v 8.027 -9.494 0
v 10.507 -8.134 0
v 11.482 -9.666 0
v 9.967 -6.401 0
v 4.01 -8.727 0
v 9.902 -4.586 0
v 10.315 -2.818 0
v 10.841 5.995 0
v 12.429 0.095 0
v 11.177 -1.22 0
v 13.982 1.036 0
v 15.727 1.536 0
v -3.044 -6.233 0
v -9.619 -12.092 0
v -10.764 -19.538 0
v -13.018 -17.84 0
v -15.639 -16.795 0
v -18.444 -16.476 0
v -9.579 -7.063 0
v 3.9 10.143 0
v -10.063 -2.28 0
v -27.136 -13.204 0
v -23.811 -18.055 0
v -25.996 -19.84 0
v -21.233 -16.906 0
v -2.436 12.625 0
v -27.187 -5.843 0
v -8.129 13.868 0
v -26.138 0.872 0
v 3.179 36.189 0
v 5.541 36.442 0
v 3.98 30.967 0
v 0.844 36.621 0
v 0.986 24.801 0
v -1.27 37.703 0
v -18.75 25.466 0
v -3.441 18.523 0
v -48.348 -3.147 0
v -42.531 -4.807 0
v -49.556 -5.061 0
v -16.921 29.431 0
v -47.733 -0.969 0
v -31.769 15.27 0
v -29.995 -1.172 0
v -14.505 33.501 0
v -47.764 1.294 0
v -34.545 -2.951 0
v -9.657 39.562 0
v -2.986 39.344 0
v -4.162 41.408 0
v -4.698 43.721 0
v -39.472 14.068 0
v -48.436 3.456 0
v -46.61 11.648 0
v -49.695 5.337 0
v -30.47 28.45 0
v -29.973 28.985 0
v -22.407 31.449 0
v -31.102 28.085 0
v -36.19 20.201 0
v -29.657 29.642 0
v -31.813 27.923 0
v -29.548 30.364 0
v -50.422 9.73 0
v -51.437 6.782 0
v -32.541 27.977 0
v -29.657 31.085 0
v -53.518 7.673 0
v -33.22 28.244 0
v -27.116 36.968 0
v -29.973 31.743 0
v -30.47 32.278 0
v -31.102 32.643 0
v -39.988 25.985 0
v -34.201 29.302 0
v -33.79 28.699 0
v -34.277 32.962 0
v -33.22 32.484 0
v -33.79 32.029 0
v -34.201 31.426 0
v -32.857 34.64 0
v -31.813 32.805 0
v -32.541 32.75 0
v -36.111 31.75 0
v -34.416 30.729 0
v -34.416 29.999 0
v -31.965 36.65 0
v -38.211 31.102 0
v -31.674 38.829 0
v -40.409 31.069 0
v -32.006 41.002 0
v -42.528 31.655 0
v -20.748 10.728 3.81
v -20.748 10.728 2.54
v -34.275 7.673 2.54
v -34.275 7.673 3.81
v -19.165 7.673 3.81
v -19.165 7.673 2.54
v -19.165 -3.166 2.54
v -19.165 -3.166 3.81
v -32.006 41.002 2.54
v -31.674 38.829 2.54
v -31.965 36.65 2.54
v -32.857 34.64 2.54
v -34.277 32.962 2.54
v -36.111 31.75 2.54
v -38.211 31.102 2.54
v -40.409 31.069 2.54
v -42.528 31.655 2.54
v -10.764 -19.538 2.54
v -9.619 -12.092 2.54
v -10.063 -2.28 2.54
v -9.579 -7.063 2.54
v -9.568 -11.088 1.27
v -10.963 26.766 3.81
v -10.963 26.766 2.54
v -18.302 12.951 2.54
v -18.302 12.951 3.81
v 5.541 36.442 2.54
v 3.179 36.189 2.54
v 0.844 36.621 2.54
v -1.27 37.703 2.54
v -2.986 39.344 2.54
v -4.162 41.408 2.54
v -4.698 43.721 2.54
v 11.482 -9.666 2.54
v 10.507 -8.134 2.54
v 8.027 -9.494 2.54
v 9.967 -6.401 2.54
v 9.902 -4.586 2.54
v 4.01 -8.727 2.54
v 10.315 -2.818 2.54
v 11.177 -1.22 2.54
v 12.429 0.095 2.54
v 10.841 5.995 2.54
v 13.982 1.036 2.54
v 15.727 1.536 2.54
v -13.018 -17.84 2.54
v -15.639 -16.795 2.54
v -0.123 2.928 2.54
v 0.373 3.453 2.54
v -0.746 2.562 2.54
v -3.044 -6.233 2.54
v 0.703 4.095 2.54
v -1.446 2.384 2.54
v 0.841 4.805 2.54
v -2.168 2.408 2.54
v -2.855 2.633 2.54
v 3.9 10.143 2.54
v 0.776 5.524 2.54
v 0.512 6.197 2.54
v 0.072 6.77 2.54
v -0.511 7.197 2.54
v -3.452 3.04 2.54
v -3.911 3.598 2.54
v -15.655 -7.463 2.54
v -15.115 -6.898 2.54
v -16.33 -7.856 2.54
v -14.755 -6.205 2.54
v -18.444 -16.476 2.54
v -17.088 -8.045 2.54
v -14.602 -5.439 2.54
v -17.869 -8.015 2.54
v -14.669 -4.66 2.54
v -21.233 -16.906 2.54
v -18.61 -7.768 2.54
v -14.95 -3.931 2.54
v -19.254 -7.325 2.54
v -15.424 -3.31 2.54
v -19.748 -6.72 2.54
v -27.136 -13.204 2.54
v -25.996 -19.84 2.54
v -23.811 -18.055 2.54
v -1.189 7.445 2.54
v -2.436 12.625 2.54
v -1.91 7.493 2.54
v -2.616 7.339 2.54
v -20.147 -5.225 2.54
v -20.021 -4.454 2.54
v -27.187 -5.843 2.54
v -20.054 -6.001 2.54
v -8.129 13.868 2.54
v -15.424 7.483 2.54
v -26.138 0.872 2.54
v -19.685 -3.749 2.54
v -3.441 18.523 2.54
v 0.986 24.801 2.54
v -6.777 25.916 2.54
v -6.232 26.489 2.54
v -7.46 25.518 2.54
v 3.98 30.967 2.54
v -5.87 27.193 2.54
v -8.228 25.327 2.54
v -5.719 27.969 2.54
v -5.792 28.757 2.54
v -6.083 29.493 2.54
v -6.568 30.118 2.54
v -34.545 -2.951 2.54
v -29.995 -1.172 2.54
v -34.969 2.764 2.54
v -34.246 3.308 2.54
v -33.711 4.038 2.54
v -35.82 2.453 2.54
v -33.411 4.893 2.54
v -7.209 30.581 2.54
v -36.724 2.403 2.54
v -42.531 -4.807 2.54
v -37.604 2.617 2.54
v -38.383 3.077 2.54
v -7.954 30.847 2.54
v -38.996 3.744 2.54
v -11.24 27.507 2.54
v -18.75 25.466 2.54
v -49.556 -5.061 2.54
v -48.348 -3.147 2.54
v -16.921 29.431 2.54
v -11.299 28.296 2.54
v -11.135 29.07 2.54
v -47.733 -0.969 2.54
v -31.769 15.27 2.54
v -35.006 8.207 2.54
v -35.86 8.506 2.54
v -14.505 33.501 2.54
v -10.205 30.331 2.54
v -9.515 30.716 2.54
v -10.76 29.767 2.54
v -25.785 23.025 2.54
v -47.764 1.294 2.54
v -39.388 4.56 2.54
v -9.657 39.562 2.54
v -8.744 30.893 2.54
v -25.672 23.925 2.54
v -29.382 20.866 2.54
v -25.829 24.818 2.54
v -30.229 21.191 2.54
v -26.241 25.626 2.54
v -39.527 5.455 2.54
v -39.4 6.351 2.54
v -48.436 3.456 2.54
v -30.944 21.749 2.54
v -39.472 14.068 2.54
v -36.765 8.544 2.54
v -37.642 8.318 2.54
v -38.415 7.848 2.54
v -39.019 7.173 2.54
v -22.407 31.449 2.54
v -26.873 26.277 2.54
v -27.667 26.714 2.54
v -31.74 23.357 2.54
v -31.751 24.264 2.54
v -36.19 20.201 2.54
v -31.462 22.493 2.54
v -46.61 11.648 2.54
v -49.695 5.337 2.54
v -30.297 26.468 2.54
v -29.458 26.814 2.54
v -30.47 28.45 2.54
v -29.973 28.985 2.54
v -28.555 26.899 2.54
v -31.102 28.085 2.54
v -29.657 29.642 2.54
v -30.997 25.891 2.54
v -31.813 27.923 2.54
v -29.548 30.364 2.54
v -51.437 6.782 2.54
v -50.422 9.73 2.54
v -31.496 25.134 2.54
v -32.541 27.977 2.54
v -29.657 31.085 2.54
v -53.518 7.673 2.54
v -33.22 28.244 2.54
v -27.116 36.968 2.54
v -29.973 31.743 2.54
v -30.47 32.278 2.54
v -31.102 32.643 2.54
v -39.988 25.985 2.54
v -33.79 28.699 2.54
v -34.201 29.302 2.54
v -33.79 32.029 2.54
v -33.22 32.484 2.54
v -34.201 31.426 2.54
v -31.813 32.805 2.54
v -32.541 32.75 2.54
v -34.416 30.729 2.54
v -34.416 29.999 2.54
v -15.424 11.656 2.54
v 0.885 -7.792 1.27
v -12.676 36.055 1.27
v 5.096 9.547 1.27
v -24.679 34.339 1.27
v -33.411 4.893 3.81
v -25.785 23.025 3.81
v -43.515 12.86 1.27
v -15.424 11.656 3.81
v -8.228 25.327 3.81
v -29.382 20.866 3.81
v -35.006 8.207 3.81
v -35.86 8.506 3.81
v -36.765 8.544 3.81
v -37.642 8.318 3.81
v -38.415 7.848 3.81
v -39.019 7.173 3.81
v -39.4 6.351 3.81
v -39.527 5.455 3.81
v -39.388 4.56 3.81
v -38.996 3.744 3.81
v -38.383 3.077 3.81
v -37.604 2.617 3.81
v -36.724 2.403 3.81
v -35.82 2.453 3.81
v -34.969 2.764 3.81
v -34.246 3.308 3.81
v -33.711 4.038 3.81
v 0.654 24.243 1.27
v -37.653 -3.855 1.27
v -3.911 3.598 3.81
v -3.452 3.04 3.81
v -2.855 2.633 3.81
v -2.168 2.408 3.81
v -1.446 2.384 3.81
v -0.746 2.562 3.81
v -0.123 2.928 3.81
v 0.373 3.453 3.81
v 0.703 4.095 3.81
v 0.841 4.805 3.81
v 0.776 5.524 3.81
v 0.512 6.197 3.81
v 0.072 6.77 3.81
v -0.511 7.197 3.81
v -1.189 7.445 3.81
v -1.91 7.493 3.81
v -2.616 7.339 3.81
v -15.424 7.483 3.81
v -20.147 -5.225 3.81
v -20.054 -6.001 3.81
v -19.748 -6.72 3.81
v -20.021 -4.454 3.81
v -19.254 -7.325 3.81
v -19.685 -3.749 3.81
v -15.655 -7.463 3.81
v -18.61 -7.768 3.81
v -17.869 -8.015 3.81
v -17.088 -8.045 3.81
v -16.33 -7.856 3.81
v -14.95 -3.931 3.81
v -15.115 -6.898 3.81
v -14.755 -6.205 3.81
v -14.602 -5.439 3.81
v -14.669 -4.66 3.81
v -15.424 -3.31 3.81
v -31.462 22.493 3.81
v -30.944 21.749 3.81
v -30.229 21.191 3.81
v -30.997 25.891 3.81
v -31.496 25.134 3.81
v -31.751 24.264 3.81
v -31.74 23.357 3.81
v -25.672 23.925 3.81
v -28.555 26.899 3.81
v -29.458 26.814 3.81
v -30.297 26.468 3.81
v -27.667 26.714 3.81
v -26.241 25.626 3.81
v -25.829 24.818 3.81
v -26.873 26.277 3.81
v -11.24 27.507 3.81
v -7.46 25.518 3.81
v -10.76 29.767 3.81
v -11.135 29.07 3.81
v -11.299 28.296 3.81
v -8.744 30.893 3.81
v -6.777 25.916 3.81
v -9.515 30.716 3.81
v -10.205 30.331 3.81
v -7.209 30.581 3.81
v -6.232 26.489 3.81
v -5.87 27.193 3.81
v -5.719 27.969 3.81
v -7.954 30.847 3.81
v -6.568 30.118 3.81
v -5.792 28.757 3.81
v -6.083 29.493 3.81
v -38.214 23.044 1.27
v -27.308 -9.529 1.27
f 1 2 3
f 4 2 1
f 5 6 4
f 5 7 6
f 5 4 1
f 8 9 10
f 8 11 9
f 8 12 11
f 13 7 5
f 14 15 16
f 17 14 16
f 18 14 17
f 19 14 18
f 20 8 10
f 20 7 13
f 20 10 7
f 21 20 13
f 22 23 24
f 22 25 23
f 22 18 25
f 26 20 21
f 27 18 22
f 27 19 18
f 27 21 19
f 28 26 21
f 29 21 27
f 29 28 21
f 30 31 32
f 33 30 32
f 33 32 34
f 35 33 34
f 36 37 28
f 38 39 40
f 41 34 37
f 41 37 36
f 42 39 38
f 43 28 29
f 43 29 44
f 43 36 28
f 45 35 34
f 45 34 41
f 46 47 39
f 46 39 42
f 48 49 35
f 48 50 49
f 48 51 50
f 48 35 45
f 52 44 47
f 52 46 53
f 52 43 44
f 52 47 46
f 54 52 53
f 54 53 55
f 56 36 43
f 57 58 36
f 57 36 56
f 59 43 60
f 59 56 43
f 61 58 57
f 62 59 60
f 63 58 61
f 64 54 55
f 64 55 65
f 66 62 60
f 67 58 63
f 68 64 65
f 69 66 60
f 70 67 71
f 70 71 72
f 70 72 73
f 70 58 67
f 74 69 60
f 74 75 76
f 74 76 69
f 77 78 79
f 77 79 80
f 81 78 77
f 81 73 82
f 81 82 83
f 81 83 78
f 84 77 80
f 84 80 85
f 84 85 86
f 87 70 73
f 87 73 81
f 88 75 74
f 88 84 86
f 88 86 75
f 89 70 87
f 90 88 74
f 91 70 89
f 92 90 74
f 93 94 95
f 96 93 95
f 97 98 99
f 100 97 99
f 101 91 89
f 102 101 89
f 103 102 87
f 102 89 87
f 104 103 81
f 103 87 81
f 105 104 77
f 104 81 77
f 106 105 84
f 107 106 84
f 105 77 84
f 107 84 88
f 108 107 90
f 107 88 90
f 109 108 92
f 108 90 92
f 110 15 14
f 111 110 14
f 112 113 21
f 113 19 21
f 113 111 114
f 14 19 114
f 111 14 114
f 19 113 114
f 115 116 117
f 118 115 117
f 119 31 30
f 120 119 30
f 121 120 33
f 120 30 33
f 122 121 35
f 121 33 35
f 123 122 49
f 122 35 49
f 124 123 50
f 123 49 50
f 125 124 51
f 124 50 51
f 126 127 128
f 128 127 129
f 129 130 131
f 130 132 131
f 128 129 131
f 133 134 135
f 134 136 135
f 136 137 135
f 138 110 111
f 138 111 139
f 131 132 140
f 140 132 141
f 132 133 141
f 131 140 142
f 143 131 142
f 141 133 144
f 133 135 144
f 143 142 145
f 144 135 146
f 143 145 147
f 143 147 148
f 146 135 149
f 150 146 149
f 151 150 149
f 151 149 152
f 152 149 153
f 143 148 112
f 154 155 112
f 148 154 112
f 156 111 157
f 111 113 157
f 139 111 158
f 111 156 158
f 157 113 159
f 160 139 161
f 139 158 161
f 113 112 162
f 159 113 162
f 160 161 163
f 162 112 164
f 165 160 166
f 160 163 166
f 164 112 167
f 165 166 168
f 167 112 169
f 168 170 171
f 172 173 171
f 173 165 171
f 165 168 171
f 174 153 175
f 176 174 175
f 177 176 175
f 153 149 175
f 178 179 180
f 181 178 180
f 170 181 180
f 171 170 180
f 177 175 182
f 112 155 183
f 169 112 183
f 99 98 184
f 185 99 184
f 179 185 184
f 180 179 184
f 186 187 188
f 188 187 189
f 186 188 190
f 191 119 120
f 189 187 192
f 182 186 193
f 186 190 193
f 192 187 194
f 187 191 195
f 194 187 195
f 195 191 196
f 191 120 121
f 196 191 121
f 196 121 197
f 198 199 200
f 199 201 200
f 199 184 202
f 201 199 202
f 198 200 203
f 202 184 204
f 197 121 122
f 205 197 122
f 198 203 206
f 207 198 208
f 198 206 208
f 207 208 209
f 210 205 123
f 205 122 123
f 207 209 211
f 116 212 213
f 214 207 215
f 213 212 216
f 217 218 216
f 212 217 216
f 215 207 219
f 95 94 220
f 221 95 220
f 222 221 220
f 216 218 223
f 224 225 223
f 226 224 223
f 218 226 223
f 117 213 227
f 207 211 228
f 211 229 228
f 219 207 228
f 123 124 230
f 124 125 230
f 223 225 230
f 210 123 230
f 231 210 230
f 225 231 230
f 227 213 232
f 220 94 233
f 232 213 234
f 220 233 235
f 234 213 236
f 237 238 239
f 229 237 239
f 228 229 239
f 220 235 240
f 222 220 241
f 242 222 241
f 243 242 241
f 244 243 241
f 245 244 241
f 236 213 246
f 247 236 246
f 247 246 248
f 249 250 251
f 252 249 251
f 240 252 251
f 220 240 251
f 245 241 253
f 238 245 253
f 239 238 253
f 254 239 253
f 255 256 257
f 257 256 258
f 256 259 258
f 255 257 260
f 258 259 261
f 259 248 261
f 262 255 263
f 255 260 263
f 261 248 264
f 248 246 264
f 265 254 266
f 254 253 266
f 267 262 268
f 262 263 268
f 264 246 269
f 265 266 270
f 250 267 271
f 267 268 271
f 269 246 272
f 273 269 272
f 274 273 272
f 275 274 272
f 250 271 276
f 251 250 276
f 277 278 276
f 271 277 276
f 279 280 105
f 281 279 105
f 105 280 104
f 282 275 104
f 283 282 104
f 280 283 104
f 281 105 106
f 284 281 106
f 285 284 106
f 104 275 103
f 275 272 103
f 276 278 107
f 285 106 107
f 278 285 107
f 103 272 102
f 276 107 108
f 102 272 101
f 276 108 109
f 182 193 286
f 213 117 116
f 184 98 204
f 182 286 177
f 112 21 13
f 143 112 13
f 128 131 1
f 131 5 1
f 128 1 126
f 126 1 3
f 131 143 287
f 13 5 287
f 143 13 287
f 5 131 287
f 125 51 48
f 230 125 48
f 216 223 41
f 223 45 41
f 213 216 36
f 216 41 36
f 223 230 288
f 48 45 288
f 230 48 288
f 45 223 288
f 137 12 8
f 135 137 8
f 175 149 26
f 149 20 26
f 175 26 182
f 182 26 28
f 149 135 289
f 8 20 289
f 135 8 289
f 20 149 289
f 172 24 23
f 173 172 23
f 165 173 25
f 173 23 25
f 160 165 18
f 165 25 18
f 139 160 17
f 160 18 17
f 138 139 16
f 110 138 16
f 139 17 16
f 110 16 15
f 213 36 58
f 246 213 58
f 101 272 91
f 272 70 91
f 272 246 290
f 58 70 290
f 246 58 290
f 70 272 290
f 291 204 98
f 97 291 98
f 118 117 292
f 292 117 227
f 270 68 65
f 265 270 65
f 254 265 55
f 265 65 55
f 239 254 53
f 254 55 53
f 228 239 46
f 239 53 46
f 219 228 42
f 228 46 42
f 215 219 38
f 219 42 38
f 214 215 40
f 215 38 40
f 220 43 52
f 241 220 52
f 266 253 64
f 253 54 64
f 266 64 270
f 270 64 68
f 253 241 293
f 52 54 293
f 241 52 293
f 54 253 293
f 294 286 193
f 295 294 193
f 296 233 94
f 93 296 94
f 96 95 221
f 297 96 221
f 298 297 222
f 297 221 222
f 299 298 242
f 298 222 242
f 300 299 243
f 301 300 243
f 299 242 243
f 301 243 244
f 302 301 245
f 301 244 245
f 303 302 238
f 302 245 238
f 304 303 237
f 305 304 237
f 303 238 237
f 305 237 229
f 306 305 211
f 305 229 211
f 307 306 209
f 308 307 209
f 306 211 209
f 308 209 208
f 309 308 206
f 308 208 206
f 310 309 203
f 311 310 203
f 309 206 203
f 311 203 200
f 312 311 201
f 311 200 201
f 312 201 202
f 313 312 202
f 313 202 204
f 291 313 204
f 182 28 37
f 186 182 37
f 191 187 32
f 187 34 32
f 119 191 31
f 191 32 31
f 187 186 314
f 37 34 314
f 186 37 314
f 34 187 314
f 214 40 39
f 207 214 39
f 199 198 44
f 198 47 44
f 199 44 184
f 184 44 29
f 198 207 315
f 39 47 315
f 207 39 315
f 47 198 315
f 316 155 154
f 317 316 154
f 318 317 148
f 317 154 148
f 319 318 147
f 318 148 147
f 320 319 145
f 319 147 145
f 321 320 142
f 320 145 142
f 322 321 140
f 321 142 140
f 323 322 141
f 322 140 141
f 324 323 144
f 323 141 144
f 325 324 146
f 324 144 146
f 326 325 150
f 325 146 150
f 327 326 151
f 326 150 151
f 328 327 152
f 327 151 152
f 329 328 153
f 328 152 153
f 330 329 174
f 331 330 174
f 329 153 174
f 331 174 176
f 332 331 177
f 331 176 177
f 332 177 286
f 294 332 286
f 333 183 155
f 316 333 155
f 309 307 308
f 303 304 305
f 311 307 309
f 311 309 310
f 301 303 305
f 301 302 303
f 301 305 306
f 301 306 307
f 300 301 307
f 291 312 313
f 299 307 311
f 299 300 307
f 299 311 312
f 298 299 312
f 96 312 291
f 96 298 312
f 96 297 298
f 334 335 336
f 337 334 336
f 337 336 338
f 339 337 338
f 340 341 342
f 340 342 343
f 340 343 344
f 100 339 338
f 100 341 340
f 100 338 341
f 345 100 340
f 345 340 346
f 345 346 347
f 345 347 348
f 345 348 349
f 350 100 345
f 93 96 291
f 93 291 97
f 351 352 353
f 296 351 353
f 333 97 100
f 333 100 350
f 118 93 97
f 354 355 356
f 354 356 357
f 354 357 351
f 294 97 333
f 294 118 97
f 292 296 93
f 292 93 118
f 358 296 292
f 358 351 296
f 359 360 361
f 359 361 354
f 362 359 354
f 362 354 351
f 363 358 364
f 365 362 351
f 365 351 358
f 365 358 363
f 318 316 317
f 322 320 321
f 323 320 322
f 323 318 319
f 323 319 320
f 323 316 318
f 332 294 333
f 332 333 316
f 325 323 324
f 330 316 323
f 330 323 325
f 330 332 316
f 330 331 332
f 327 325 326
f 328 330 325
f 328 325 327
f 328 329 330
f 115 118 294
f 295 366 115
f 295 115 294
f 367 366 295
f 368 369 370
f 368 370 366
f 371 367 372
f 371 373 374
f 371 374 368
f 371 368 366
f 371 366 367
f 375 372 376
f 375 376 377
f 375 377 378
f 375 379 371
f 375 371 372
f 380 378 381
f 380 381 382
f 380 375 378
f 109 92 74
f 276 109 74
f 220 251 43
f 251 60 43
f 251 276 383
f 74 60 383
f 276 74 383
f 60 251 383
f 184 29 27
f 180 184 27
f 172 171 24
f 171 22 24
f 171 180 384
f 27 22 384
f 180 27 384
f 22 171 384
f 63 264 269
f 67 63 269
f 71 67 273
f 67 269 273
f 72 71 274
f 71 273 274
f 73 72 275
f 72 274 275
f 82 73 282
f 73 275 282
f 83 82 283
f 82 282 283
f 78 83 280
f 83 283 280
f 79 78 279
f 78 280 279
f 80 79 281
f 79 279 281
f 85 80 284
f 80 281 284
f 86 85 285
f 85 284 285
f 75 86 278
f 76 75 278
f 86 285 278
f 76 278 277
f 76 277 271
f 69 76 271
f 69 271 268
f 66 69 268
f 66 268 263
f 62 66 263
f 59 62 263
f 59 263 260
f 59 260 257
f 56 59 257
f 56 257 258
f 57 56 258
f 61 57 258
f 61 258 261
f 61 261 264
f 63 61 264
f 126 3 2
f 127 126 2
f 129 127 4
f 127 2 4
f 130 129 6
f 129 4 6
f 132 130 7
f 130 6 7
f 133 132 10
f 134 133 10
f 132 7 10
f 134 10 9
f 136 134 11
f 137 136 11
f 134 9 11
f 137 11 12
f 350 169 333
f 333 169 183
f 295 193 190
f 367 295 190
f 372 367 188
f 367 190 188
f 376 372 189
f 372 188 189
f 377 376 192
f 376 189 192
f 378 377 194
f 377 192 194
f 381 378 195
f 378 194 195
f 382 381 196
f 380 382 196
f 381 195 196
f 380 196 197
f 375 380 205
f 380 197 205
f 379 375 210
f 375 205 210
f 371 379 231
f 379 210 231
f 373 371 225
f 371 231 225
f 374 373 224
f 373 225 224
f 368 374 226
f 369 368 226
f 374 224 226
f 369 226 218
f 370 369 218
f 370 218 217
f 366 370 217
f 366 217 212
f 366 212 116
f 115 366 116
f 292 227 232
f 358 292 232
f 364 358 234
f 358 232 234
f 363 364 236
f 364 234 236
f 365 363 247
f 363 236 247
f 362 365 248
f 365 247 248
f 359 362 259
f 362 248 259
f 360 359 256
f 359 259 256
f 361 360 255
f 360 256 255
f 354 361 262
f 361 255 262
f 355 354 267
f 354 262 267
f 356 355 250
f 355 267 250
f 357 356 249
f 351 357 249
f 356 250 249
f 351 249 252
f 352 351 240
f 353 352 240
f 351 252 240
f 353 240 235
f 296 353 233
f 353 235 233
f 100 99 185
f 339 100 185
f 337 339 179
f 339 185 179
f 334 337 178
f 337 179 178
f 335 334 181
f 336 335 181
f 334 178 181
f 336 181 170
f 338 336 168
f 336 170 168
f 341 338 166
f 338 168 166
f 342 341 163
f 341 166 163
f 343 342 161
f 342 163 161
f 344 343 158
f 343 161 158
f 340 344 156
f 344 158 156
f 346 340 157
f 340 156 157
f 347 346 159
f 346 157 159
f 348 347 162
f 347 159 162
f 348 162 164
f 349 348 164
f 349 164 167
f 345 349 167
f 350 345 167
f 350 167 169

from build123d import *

# Parameters (mm, degrees)
F1_DEPTH = 2.54
F2_R     = 2.4478188867
F3_DEPTH = 25.4
F5_DEPTH = 1.27


with BuildPart() as f1:
    # F0 (on Top) → F1 (new body)
    with BuildSketch(Plane.XY):
        with BuildLine():
            add(Edge.make_bspline(
                [(-8.1293506725, 13.8677618036), (-13.0062829494, 14.4740161408), (-15.8992987585, 13.1955885586)],
                knots=[5.3621765201, 5.3621765201, 5.3621765201, 5.923451431, 5.923451431, 5.923451431], degree=2, weights=[1, 0.9608790786, 1]))
            add(Edge.make_bspline(
                [(-8.1293506725, 13.8677618036), (3.2191549473, 23.0429297149), (5.5405121801, 36.4422092533)],
                knots=[0.9210087871, 0.9210087871, 0.9210087871, 2.3368799745, 2.3368799745, 2.3368799745], degree=2, weights=[1, 0.7597059088, 1]))
            ThreePointArc((5.5405121801, 36.4422092533), (-1.2696831758, 37.7032314), (-4.698329526, 43.7209819636))
            add(Edge.make_bspline(
                [(-4.698329526, 43.7209819636), (-13.840110732, 37.842561491), (-18.7504788391, 25.4664124261)],
                knots=[3.9042333143, 3.9042333143, 3.9042333143, 5.1309929011, 5.1309929011, 5.1309929011], degree=2, weights=[1, 0.8177071664, 1]))
            add(Edge.make_bspline(
                [(-15.8992987585, 13.1955885586), (-14.9909904148, 18.0024303196), (-18.7504788391, 25.4664124261)],
                knots=[0.3890102653, 0.3890102653, 0.3890102653, 1.2079252474, 1.2079252474, 1.2079252474], degree=2, weights=[1, 0.917336937, 1]))
        make_face()
        with BuildLine():
            add(Edge.make_bspline(
                [(-18.3283618618, 11.1091458655), (-18.4977635058, 11.1131186151), (-18.6671083791, 11.1023364909)],
                knots=[3.1313329127, 3.1313329127, 3.1313329127, 3.1694409122, 3.1694409122, 3.1694409122], degree=2, weights=[1, 0.999818478, 1]))
            add(Edge.make_bspline(
                [(-15.8992987585, 13.1955885586), (-17.6072200733, 12.4408558295), (-18.3283618618, 11.1091458655)],
                knots=[5.923451431, 5.923451431, 5.923451431, 6.2605585753, 6.2605585753, 6.2605585753], degree=2, weights=[1, 0.9858284459, 1]))
            add(Edge.make_bspline(
                [(-15.8992987585, 13.1955885586), (-14.9909904148, 18.0024303196), (-18.7504788391, 25.4664124261)],
                knots=[0.3890102653, 0.3890102653, 0.3890102653, 1.2079252474, 1.2079252474, 1.2079252474], degree=2, weights=[1, 0.917336937, 1]))
            add(Edge.make_bspline(
                [(-18.7504788391, 25.4664124261), (-23.1152645716, 14.4653555432), (-18.6671083791, 11.1023364909)],
                knots=[5.1309929011, 5.1309929011, 5.1309929011, 6.2492635537, 6.2492635537, 6.2492635537], degree=2, weights=[1, 0.847714097, 1]))
        make_face()
        with BuildLine():
            add(Edge.make_bspline(
                [(-18.6671083791, 11.1023364909), (-18.9426872846, 11.084790486), (-19.217261025, 11.0282486857)],
                knots=[3.1694409122, 3.1694409122, 3.1694409122, 3.2314425944, 3.2314425944, 3.2314425944], degree=2, weights=[1, 0.9995195124, 1]))
            add(Edge.make_bspline(
                [(-18.7504788391, 25.4664124261), (-23.1152645716, 14.4653555432), (-18.6671083791, 11.1023364909)],
                knots=[5.1309929011, 5.1309929011, 5.1309929011, 6.2492635537, 6.2492635537, 6.2492635537], degree=2, weights=[1, 0.847714097, 1]))
            add(Edge.make_bspline(
                [(-18.7504788391, 25.4664124261), (-23.8658033607, 35.622233216), (-32.0064408454, 41.0016310267)],
                knots=[1.2079252474, 1.2079252474, 1.2079252474, 2.2747363454, 2.2747363454, 2.2747363454], degree=2, weights=[1, 0.861080452, 1]))
            ThreePointArc((-32.0064408454, 41.0016310267), (-34.2766878119, 32.9620074398), (-42.5278444814, 31.6551094622))
            add(Edge.make_bspline(
                [(-42.5278444814, 31.6551094622), (-39.4326529231, 22.5643761786), (-31.7688000788, 15.2701366935)],
                knots=[4.0918939552, 4.0918939552, 4.0918939552, 5.1043441076, 5.1043441076, 5.1043441076], degree=2, weights=[1, 0.8745811169, 1]))
            add(Edge.make_bspline(
                [(-19.217261025, 11.0282486857), (-21.0537599835, 15.8717065704), (-31.7688000788, 15.2701366935)],
                knots=[0.0355549151, 0.0355549151, 0.0355549151, 1.0884005179, 1.0884005179, 1.0884005179], degree=2, weights=[1, 0.8646099394, 1]))
        make_face()
        with BuildLine():
            add(Edge.make_bspline(
                [(-49.5557408605, -5.0613393168), (-37.4112986885, -6.0471883825), (-26.1381579613, 0.8721302608)],
                knots=[3.9984789777, 3.9984789777, 3.9984789777, 5.2750169926, 5.2750169926, 5.2750169926], degree=2, weights=[1, 0.8031282966, 1]))
            add(Edge.make_bspline(
                [(-22.0543003481, 9.3342240027), (-24.6998426208, 6.6251102399), (-26.1381579613, 0.8721302608)],
                knots=[3.5627929422, 3.5627929422, 3.5627929422, 4.1932217971, 4.1932217971, 4.1932217971], degree=2, weights=[1, 0.9507299239, 1]))
            add(Edge.make_bspline(
                [(-31.7688000788, 15.2701366935), (-26.5047883189, 10.2599984236), (-22.0543003481, 9.3342240027)],
                knots=[5.1043441076, 5.1043441076, 5.1043441076, 5.8320454274, 5.8320454274, 5.8320454274], degree=2, weights=[1, 0.9345334002, 1]))
            add(Edge.make_bspline(
                [(-31.7688000788, 15.2701366935), (-44.5755870345, 14.5511307743), (-53.518205674, 7.6725440865)],
                knots=[1.0884005179, 1.0884005179, 1.0884005179, 2.3025399143, 2.3025399143, 2.3025399143], degree=2, weights=[1, 0.821323171, 1]))
            ThreePointArc((-53.518205674, 7.6725440865), (-48.0219304325, 2.3993954651), (-49.5557408605, -5.0613393168))
        make_face()
        with BuildLine():
            ThreePointArc((-25.9959172097, -19.8404580769), (-18.4435146916, -16.4764784527), (-10.7636362879, -19.5382770108))
            add(Edge.make_bspline(
                [(-10.7636362879, -19.5382770108), (-8.6329149556, -11.286799204), (-10.0625585352, -2.2797077491)],
                knots=[1.0375960775, 1.0375960775, 1.0375960775, 1.9188268736, 1.9188268736, 1.9188268736], degree=2, weights=[1, 0.9044893696, 1]))
            add(Edge.make_bspline(
                [(-18.8036627166, 9.4223104106), (-19.1581055578, 4.0259429354), (-10.0625585352, -2.2797077491)],
                knots=[0.1725226653, 0.1725226653, 0.1725226653, 1.2141781775, 1.2141781775, 1.2141781775], degree=2, weights=[1, 0.8674075869, 1]))
            add(Edge.make_bspline(
                [(-18.968622651, 9.3695263971), (-18.8851978683, 9.3944363277), (-18.8036627166, 9.4223104106)],
                knots=[6.1291457004, 6.1291457004, 6.1291457004, 6.1478253328, 6.1478253328, 6.1478253328], degree=2, weights=[1, 0.9999563842, 1]))
            add(Edge.make_bspline(
                [(-26.1381579613, 0.8721302608), (-19.2047000054, 5.1278036404), (-18.968622651, 9.3695263971)],
                knots=[5.2750169926, 5.2750169926, 5.2750169926, 6.13113397, 6.13113397, 6.13113397], degree=2, weights=[1, 0.9097733954, 1]))
            add(Edge.make_bspline(
                [(-26.1381579613, 0.8721302608), (-28.7514373337, -9.580475983), (-25.9959172097, -19.8404580769)],
                knots=[4.1932217971, 4.1932217971, 4.1932217971, 5.2629472206, 5.2629472206, 5.2629472206], degree=2, weights=[1, 0.8603386164, 1]))
        make_face()
        with BuildLine():
            add(Edge.make_bspline(
                [(-10.0625585352, -2.2797077491), (-11.591893318, 7.3554617789), (-15.8909007735, 10.2708762745)],
                knots=[1.9188268736, 1.9188268736, 1.9188268736, 2.853170758, 2.853170758, 2.853170758], degree=2, weights=[1, 0.8928455097, 1]))
            add(Edge.make_bspline(
                [(-10.0625585352, -2.2797077491), (1.0990392267, -10.0176850683), (11.4824191077, -9.6655475308)],
                knots=[1.2141781775, 1.2141781775, 1.2141781775, 2.440947022, 2.440947022, 2.440947022], degree=2, weights=[1, 0.8177045019, 1]))
            ThreePointArc((11.4824191077, -9.6655475308), (10.3145579677, -2.8178027009), (15.7274971882, 1.5359999924))
            add(Edge.make_bspline(
                [(15.7274971882, 1.5359999924), (6.8261776479, 12.0086312281), (-8.1293506725, 13.8677618036)],
                knots=[3.9144495075, 3.9144495075, 3.9144495075, 5.3621765201, 5.3621765201, 5.3621765201], degree=2, weights=[1, 0.7492525877, 1]))
            add(Edge.make_bspline(
                [(-15.8909007735, 10.2708762745), (-12.5066175517, 10.3287796719), (-8.1293506725, 13.8677618036)],
                knots=[0.2832443256, 0.2832443256, 0.2832443256, 0.9210087871, 0.9210087871, 0.9210087871], degree=2, weights=[1, 0.9495864378, 1]))
        make_face()
        with BuildLine():
            add(Edge.make_bspline(
                [(-18.8036627166, 9.4223104106), (-19.1581055578, 4.0259429354), (-10.0625585352, -2.2797077491)],
                knots=[0.1725226653, 0.1725226653, 0.1725226653, 1.2141781775, 1.2141781775, 1.2141781775], degree=2, weights=[1, 0.8674075869, 1]))
            add(Edge.make_bspline(
                [(-10.0625585352, -2.2797077491), (-11.591893318, 7.3554617789), (-15.8909007735, 10.2708762745)],
                knots=[1.9188268736, 1.9188268736, 1.9188268736, 2.853170758, 2.853170758, 2.853170758], degree=2, weights=[1, 0.8928455097, 1]))
            add(Edge.make_bspline(
                [(-17.2241931915, 10.4165103763), (-16.6012589778, 10.2587224001), (-15.8909007735, 10.2708762745)],
                knots=[0.1448694059, 0.1448694059, 0.1448694059, 0.2832443256, 0.2832443256, 0.2832443256], degree=2, weights=[1, 0.9976075023, 1]))
            add(Edge.make_bspline(
                [(-18.8036627166, 9.4223104106), (-17.88406247, 9.7366903191), (-17.2241931915, 10.4165103763)],
                knots=[6.1478253328, 6.1478253328, 6.1478253328, 6.3577368887, 6.3577368887, 6.3577368887], degree=2, weights=[1, 0.9944971966, 1]))
        make_face()
        with BuildLine():
            add(Edge.make_bspline(
                [(-15.8909007735, 10.2708762745), (-16.3835971803, 10.6050032239), (-16.8898563503, 10.8071326543)],
                knots=[2.853170758, 2.853170758, 2.853170758, 2.9686608036, 2.9686608036, 2.9686608036], degree=2, weights=[1, 0.9983332194, 1]))
            add(Edge.make_bspline(
                [(-15.8909007735, 10.2708762745), (-12.5066175517, 10.3287796719), (-8.1293506725, 13.8677618036)],
                knots=[0.2832443256, 0.2832443256, 0.2832443256, 0.9210087871, 0.9210087871, 0.9210087871], degree=2, weights=[1, 0.9495864378, 1]))
            add(Edge.make_bspline(
                [(-8.1293506725, 13.8677618036), (-13.0062829494, 14.4740161408), (-15.8992987585, 13.1955885586)],
                knots=[5.3621765201, 5.3621765201, 5.3621765201, 5.923451431, 5.923451431, 5.923451431], degree=2, weights=[1, 0.9608790786, 1]))
            add(Edge.make_bspline(
                [(-16.8898563503, 10.8071326543), (-16.1706479753, 11.759586395), (-15.8992987585, 13.1955885586)],
                knots=[0.1311493399, 0.1311493399, 0.1311493399, 0.3890102653, 0.3890102653, 0.3890102653], degree=2, weights=[1, 0.9916999751, 1]))
        make_face()
        with BuildLine():
            add(Edge.make_bspline(
                [(-22.0543003481, 9.3342240027), (-24.6998426208, 6.6251102399), (-26.1381579613, 0.8721302608)],
                knots=[3.5627929422, 3.5627929422, 3.5627929422, 4.1932217971, 4.1932217971, 4.1932217971], degree=2, weights=[1, 0.9507299239, 1]))
            add(Edge.make_bspline(
                [(-26.1381579613, 0.8721302608), (-19.2047000054, 5.1278036404), (-18.968622651, 9.3695263971)],
                knots=[5.2750169926, 5.2750169926, 5.2750169926, 6.13113397, 6.13113397, 6.13113397], degree=2, weights=[1, 0.9097733954, 1]))
            add(Edge.make_bspline(
                [(-22.0543003481, 9.3342240027), (-20.3053052052, 8.970404355), (-18.968622651, 9.3695263971)],
                knots=[5.8320454274, 5.8320454274, 5.8320454274, 6.1291457004, 6.1291457004, 6.1291457004], degree=2, weights=[1, 0.9889867035, 1]))
        make_face()
        with BuildLine():
            add(Edge.make_bspline(
                [(-31.7688000788, 15.2701366935), (-26.5047883189, 10.2599984236), (-22.0543003481, 9.3342240027)],
                knots=[5.1043441076, 5.1043441076, 5.1043441076, 5.8320454274, 5.8320454274, 5.8320454274], degree=2, weights=[1, 0.9345334002, 1]))
            add(Edge.make_bspline(
                [(-19.217261025, 11.0282486857), (-20.6977425429, 10.7233794352), (-22.0543003481, 9.3342240027)],
                knots=[3.2314425944, 3.2314425944, 3.2314425944, 3.5627929422, 3.5627929422, 3.5627929422], degree=2, weights=[1, 0.9863072316, 1]))
            add(Edge.make_bspline(
                [(-19.217261025, 11.0282486857), (-21.0537599835, 15.8717065704), (-31.7688000788, 15.2701366935)],
                knots=[0.0355549151, 0.0355549151, 0.0355549151, 1.0884005179, 1.0884005179, 1.0884005179], degree=2, weights=[1, 0.8646099394, 1]))
        make_face()
        with BuildLine():
            add(Edge.make_bspline(
                [(-22.0543003481, 9.3342240027), (-20.3053052052, 8.970404355), (-18.968622651, 9.3695263971)],
                knots=[5.8320454274, 5.8320454274, 5.8320454274, 6.1291457004, 6.1291457004, 6.1291457004], degree=2, weights=[1, 0.9889867035, 1]))
            add(Edge.make_bspline(
                [(-18.968622651, 9.3695263971), (-18.9199457345, 10.2441294891), (-19.217261025, 11.0282486857)],
                knots=[6.13113397, 6.13113397, 6.13113397, 6.3187402223, 6.3187402223, 6.3187402223], degree=2, weights=[1, 0.9956037118, 1]))
            add(Edge.make_bspline(
                [(-19.217261025, 11.0282486857), (-20.6977425429, 10.7233794352), (-22.0543003481, 9.3342240027)],
                knots=[3.2314425944, 3.2314425944, 3.2314425944, 3.5627929422, 3.5627929422, 3.5627929422], degree=2, weights=[1, 0.9863072316, 1]))
        make_face()
        with BuildLine():
            add(Edge.make_bspline(
                [(-16.8898563503, 10.8071326543), (-17.6037237269, 11.0921518989), (-18.3283618618, 11.1091458655)],
                knots=[2.9686608036, 2.9686608036, 2.9686608036, 3.1313329127, 3.1313329127, 3.1313329127], degree=2, weights=[1, 0.9966940463, 1]))
            add(Edge.make_bspline(
                [(-16.8898563503, 10.8071326543), (-16.1706479753, 11.759586395), (-15.8992987585, 13.1955885586)],
                knots=[0.1311493399, 0.1311493399, 0.1311493399, 0.3890102653, 0.3890102653, 0.3890102653], degree=2, weights=[1, 0.9916999751, 1]))
            add(Edge.make_bspline(
                [(-15.8992987585, 13.1955885586), (-17.6072200733, 12.4408558295), (-18.3283618618, 11.1091458655)],
                knots=[5.923451431, 5.923451431, 5.923451431, 6.2605585753, 6.2605585753, 6.2605585753], degree=2, weights=[1, 0.9858284459, 1]))
        make_face()
        with BuildLine():
            add(Edge.make_bspline(
                [(-17.2241931915, 10.4165103763), (-17.0468812663, 10.5991832284), (-16.8898563503, 10.8071326543)],
                knots=[0.0745515815, 0.0745515815, 0.0745515815, 0.1311493399, 0.1311493399, 0.1311493399], degree=2, weights=[1, 0.9995996134, 1]))
            add(Edge.make_bspline(
                [(-16.8898563503, 10.8071326543), (-17.6037237269, 11.0921518989), (-18.3283618618, 11.1091458655)],
                knots=[2.9686608036, 2.9686608036, 2.9686608036, 3.1313329127, 3.1313329127, 3.1313329127], degree=2, weights=[1, 0.9966940463, 1]))
            add(Edge.make_bspline(
                [(-18.3283618618, 11.1091458655), (-18.3763079047, 11.020605409), (-18.4195693582, 10.9298044945)],
                knots=[6.2605585753, 6.2605585753, 6.2605585753, 6.2831853072, 6.2831853072, 6.2831853072], degree=2, weights=[1, 0.9999360046, 1]))
            add(Edge.make_bspline(
                [(-18.4195693582, 10.9298044945), (-17.8764644053, 10.5817293553), (-17.2241931915, 10.4165103763)],
                knots=[0, 0, 0, 0.1448694059, 0.1448694059, 0.1448694059], degree=2, weights=[1, 0.9973777537, 1]))
        make_face()
        with BuildLine():
            add(Edge.make_bspline(
                [(-18.4195693582, 10.9298044945), (-18.750232644, 10.2357795294), (-18.8036627166, 9.4223104106)],
                knots=[0, 0, 0, 0.1725226653, 0.1725226653, 0.1725226653], degree=2, weights=[1, 0.9962817977, 1]))
            add(Edge.make_bspline(
                [(-18.8036627166, 9.4223104106), (-17.88406247, 9.7366903191), (-17.2241931915, 10.4165103763)],
                knots=[6.1478253328, 6.1478253328, 6.1478253328, 6.3577368887, 6.3577368887, 6.3577368887], degree=2, weights=[1, 0.9944971966, 1]))
            add(Edge.make_bspline(
                [(-18.4195693582, 10.9298044945), (-17.8764644053, 10.5817293553), (-17.2241931915, 10.4165103763)],
                knots=[0, 0, 0, 0.1448694059, 0.1448694059, 0.1448694059], degree=2, weights=[1, 0.9973777537, 1]))
        make_face()
        with BuildLine():
            add(Edge.make_bspline(
                [(-18.968622651, 9.3695263971), (-18.8851978683, 9.3944363277), (-18.8036627166, 9.4223104106)],
                knots=[6.1291457004, 6.1291457004, 6.1291457004, 6.1478253328, 6.1478253328, 6.1478253328], degree=2, weights=[1, 0.9999563842, 1]))
            add(Edge.make_bspline(
                [(-18.4195693582, 10.9298044945), (-18.750232644, 10.2357795294), (-18.8036627166, 9.4223104106)],
                knots=[0, 0, 0, 0.1725226653, 0.1725226653, 0.1725226653], degree=2, weights=[1, 0.9962817977, 1]))
            add(Edge.make_bspline(
                [(-18.6671083791, 11.1023364909), (-18.5465292502, 11.0111728964), (-18.4195693582, 10.9298044945)],
                knots=[6.2492635537, 6.2492635537, 6.2492635537, 6.2831853072, 6.2831853072, 6.2831853072], degree=2, weights=[1, 0.9998561678, 1]))
            add(Edge.make_bspline(
                [(-18.6671083791, 11.1023364909), (-18.9426872846, 11.084790486), (-19.217261025, 11.0282486857)],
                knots=[3.1694409122, 3.1694409122, 3.1694409122, 3.2314425944, 3.2314425944, 3.2314425944], degree=2, weights=[1, 0.9995195124, 1]))
            add(Edge.make_bspline(
                [(-18.968622651, 9.3695263971), (-18.9199457345, 10.2441294891), (-19.217261025, 11.0282486857)],
                knots=[6.13113397, 6.13113397, 6.13113397, 6.3187402223, 6.3187402223, 6.3187402223], degree=2, weights=[1, 0.9956037118, 1]))
        make_face()
        with BuildLine():
            add(Edge.make_bspline(
                [(-17.2241931915, 10.4165103763), (-16.6012589778, 10.2587224001), (-15.8909007735, 10.2708762745)],
                knots=[0.1448694059, 0.1448694059, 0.1448694059, 0.2832443256, 0.2832443256, 0.2832443256], degree=2, weights=[1, 0.9976075023, 1]))
            add(Edge.make_bspline(
                [(-15.8909007735, 10.2708762745), (-16.3835971803, 10.6050032239), (-16.8898563503, 10.8071326543)],
                knots=[2.853170758, 2.853170758, 2.853170758, 2.9686608036, 2.9686608036, 2.9686608036], degree=2, weights=[1, 0.9983332194, 1]))
            add(Edge.make_bspline(
                [(-17.2241931915, 10.4165103763), (-17.0468812663, 10.5991832284), (-16.8898563503, 10.8071326543)],
                knots=[0.0745515815, 0.0745515815, 0.0745515815, 0.1311493399, 0.1311493399, 0.1311493399], degree=2, weights=[1, 0.9995996134, 1]))
        make_face()
        with BuildLine():
            add(Edge.make_bspline(
                [(-18.6671083791, 11.1023364909), (-18.5465292502, 11.0111728964), (-18.4195693582, 10.9298044945)],
                knots=[6.2492635537, 6.2492635537, 6.2492635537, 6.2831853072, 6.2831853072, 6.2831853072], degree=2, weights=[1, 0.9998561678, 1]))
            add(Edge.make_bspline(
                [(-18.3283618618, 11.1091458655), (-18.3763079047, 11.020605409), (-18.4195693582, 10.9298044945)],
                knots=[6.2605585753, 6.2605585753, 6.2605585753, 6.2831853072, 6.2831853072, 6.2831853072], degree=2, weights=[1, 0.9999360046, 1]))
            add(Edge.make_bspline(
                [(-18.3283618618, 11.1091458655), (-18.4977635058, 11.1131186151), (-18.6671083791, 11.1023364909)],
                knots=[3.1313329127, 3.1313329127, 3.1313329127, 3.1694409122, 3.1694409122, 3.1694409122], degree=2, weights=[1, 0.999818478, 1]))
        make_face()
    extrude(amount=F1_DEPTH)

    # F2 (on face) → F3 (cut)
    with BuildSketch(Plane.XY.offset(2.54)):
        with Locations((-31.9958999753, 30.3639341146)):
            Circle(F2_R)
    extrude(amount=-F3_DEPTH, mode=Mode.SUBTRACT)

    # F4 (on face) → F5 (join)
    with BuildSketch(Plane.XY.offset(2.54)):
        with BuildLine():
            ThreePointArc((-8.228359744, 25.3271367401), (-7.2086853455, 30.5814773498), (-10.9625142068, 26.766166091))
            Line((-10.9625142068, 26.766166091), (-18.3015614748, 12.951489538))
            Line((-18.3015614748, 12.951489538), (-25.7845111191, 23.0246912688))
            ThreePointArc((-25.7845111191, 23.0246912688), (-30.2968440561, 26.4679983586), (-29.382083565, 20.8661481738))
            Line((-29.382083565, 20.8661481738), (-20.7479093224, 10.7282179445))
            Line((-20.7479093224, 10.7282179445), (-34.2747792602, 7.6725440865))
            ThreePointArc((-34.2747792602, 7.6725440865), (-39.3884028032, 4.5602256543), (-33.4113650024, 4.8929280601))
            Line((-33.4113650024, 4.8929280601), (-19.1649775952, 7.6725440865))
            Line((-19.1649775952, 7.6725440865), (-19.1649775952, -3.165632952))
            ThreePointArc((-19.1649775952, -3.165632952), (-17.4796190049, -8.0573985599), (-15.4235037044, -3.3095364925))
            Line((-15.4235037044, -3.3095364925), (-15.4235037044, 7.4831801467))
            Line((-15.4235037044, 7.4831801467), (-3.911273554, 3.5978022497))
            ThreePointArc((-3.911273554, 3.5978022497), (0.703099628, 4.0954129196), (-2.6161477435, 7.339276839))
            Line((-2.6161477435, 7.339276839), (-15.4235037044, 11.6563634947))
            Line((-15.4235037044, 11.6563634947), (-8.228359744, 25.3271367401))
        make_face()
    extrude(amount=F5_DEPTH)


solid = f1.part
